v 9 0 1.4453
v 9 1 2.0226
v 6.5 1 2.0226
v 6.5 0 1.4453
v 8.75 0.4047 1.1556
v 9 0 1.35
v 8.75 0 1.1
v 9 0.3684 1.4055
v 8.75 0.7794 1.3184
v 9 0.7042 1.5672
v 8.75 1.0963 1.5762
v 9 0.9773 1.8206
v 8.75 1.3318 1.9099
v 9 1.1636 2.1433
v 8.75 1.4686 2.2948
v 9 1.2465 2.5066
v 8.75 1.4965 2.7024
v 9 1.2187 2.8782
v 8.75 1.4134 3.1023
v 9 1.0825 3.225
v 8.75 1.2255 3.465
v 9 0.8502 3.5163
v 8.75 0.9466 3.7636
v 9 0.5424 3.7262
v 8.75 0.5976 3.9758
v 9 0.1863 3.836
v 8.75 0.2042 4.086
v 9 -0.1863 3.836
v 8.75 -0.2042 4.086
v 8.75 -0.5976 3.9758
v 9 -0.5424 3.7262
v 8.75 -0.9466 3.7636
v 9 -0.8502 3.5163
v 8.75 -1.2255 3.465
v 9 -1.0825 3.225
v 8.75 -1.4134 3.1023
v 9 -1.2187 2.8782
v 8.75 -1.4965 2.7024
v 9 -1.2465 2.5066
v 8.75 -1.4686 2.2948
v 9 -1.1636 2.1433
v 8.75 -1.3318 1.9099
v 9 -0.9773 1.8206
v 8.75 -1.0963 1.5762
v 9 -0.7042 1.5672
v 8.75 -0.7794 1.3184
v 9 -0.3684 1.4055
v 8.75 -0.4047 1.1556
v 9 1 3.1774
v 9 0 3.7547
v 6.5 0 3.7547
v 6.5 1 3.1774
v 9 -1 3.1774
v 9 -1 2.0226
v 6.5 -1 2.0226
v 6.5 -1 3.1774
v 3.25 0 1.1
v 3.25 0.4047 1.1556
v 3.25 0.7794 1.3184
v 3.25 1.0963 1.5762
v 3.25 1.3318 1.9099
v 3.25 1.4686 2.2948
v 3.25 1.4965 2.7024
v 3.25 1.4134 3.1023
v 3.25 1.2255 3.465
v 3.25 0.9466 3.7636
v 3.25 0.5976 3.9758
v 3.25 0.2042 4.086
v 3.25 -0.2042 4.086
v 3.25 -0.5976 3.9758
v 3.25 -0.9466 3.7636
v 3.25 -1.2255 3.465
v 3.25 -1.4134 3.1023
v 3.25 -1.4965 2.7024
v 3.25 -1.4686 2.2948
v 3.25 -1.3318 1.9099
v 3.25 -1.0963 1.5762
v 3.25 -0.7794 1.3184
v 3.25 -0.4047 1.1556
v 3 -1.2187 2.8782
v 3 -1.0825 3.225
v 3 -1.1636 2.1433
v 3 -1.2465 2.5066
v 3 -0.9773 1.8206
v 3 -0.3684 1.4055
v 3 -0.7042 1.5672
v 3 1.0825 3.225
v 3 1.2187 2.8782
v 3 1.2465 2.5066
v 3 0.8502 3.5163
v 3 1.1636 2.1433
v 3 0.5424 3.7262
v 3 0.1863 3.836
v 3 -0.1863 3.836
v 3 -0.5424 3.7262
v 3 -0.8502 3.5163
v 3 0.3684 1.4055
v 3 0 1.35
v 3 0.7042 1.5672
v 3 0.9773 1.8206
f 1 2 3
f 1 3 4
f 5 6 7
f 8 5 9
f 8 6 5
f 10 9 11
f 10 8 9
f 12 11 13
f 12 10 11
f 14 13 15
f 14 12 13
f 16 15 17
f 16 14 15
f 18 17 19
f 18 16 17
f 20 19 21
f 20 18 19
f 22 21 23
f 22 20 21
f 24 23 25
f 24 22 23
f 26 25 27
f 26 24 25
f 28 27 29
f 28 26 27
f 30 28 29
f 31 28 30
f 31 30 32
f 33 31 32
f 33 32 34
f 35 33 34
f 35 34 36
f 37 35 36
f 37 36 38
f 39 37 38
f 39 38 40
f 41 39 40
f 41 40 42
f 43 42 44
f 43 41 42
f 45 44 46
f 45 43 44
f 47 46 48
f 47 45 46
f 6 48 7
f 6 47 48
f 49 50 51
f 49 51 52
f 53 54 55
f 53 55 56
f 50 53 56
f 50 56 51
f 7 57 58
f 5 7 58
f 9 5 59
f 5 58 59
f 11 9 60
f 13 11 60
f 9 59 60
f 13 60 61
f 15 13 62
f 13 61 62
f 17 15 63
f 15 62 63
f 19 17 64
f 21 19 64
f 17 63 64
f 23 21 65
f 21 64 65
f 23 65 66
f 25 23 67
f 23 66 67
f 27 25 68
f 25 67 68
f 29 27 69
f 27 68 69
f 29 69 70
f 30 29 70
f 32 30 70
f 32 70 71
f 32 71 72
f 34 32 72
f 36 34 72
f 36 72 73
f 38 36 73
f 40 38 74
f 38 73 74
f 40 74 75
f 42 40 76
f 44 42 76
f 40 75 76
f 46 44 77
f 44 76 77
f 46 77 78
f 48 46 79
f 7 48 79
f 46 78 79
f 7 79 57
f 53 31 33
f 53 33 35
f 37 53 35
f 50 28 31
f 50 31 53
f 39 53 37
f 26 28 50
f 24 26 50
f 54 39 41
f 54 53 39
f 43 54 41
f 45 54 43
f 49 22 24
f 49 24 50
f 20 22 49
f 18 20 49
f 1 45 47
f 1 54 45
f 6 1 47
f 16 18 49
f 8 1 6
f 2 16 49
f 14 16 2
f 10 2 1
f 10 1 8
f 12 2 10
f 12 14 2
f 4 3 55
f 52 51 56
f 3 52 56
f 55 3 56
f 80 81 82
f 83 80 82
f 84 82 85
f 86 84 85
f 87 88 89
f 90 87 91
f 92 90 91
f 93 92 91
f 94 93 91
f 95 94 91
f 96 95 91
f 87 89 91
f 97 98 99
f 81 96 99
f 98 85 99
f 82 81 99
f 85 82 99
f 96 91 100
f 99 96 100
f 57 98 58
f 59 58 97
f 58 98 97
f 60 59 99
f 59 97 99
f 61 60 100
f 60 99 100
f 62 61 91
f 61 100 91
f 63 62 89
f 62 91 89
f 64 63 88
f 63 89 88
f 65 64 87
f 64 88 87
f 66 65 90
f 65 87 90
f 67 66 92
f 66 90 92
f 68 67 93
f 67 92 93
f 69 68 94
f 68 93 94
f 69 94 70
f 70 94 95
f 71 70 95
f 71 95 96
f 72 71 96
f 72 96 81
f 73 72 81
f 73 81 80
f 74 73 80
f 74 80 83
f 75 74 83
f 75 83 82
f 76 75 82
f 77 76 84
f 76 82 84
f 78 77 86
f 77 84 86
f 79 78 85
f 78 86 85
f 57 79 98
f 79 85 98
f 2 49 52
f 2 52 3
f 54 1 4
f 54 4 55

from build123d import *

# Parameters (mm, degrees)
CYLINDER012010_R     = 1.5
CYLINDER012010_DEPTH = 6
CHAMFER002_SIZE      = 0.25
POCKET018_DEPTH      = 2.5


with BuildPart() as part:
    # Cylinder012010 → Cylinder012010 (new body)
    with BuildSketch(Plane(origin=(3, 0, 2.6), x_dir=(0, 0, -1), z_dir=(1, 0, 0))):
        Circle(CYLINDER012010_R)
    extrude(amount=CYLINDER012010_DEPTH)

    # Chamfer002
    chamfer002_edges = [part.edges().sort_by_distance(p)[0] for p in [
        (9, 0, 4.1),
        (3, 0, 4.1),
    ]]
    chamfer(chamfer002_edges, length=CHAMFER002_SIZE)

    # Sketch022 (on Face5 of Chamfer002) → Pocket018 (cut)
    with BuildSketch(Plane.YZ.offset(9)):
        Polygon((-1, 3.17735), (0, 3.754701), (1, 3.17735), (1, 2.02265), (0, 1.445299), (-1, 2.02265), align=None)
    extrude(amount=-POCKET018_DEPTH, mode=Mode.SUBTRACT)


solid = part.part
